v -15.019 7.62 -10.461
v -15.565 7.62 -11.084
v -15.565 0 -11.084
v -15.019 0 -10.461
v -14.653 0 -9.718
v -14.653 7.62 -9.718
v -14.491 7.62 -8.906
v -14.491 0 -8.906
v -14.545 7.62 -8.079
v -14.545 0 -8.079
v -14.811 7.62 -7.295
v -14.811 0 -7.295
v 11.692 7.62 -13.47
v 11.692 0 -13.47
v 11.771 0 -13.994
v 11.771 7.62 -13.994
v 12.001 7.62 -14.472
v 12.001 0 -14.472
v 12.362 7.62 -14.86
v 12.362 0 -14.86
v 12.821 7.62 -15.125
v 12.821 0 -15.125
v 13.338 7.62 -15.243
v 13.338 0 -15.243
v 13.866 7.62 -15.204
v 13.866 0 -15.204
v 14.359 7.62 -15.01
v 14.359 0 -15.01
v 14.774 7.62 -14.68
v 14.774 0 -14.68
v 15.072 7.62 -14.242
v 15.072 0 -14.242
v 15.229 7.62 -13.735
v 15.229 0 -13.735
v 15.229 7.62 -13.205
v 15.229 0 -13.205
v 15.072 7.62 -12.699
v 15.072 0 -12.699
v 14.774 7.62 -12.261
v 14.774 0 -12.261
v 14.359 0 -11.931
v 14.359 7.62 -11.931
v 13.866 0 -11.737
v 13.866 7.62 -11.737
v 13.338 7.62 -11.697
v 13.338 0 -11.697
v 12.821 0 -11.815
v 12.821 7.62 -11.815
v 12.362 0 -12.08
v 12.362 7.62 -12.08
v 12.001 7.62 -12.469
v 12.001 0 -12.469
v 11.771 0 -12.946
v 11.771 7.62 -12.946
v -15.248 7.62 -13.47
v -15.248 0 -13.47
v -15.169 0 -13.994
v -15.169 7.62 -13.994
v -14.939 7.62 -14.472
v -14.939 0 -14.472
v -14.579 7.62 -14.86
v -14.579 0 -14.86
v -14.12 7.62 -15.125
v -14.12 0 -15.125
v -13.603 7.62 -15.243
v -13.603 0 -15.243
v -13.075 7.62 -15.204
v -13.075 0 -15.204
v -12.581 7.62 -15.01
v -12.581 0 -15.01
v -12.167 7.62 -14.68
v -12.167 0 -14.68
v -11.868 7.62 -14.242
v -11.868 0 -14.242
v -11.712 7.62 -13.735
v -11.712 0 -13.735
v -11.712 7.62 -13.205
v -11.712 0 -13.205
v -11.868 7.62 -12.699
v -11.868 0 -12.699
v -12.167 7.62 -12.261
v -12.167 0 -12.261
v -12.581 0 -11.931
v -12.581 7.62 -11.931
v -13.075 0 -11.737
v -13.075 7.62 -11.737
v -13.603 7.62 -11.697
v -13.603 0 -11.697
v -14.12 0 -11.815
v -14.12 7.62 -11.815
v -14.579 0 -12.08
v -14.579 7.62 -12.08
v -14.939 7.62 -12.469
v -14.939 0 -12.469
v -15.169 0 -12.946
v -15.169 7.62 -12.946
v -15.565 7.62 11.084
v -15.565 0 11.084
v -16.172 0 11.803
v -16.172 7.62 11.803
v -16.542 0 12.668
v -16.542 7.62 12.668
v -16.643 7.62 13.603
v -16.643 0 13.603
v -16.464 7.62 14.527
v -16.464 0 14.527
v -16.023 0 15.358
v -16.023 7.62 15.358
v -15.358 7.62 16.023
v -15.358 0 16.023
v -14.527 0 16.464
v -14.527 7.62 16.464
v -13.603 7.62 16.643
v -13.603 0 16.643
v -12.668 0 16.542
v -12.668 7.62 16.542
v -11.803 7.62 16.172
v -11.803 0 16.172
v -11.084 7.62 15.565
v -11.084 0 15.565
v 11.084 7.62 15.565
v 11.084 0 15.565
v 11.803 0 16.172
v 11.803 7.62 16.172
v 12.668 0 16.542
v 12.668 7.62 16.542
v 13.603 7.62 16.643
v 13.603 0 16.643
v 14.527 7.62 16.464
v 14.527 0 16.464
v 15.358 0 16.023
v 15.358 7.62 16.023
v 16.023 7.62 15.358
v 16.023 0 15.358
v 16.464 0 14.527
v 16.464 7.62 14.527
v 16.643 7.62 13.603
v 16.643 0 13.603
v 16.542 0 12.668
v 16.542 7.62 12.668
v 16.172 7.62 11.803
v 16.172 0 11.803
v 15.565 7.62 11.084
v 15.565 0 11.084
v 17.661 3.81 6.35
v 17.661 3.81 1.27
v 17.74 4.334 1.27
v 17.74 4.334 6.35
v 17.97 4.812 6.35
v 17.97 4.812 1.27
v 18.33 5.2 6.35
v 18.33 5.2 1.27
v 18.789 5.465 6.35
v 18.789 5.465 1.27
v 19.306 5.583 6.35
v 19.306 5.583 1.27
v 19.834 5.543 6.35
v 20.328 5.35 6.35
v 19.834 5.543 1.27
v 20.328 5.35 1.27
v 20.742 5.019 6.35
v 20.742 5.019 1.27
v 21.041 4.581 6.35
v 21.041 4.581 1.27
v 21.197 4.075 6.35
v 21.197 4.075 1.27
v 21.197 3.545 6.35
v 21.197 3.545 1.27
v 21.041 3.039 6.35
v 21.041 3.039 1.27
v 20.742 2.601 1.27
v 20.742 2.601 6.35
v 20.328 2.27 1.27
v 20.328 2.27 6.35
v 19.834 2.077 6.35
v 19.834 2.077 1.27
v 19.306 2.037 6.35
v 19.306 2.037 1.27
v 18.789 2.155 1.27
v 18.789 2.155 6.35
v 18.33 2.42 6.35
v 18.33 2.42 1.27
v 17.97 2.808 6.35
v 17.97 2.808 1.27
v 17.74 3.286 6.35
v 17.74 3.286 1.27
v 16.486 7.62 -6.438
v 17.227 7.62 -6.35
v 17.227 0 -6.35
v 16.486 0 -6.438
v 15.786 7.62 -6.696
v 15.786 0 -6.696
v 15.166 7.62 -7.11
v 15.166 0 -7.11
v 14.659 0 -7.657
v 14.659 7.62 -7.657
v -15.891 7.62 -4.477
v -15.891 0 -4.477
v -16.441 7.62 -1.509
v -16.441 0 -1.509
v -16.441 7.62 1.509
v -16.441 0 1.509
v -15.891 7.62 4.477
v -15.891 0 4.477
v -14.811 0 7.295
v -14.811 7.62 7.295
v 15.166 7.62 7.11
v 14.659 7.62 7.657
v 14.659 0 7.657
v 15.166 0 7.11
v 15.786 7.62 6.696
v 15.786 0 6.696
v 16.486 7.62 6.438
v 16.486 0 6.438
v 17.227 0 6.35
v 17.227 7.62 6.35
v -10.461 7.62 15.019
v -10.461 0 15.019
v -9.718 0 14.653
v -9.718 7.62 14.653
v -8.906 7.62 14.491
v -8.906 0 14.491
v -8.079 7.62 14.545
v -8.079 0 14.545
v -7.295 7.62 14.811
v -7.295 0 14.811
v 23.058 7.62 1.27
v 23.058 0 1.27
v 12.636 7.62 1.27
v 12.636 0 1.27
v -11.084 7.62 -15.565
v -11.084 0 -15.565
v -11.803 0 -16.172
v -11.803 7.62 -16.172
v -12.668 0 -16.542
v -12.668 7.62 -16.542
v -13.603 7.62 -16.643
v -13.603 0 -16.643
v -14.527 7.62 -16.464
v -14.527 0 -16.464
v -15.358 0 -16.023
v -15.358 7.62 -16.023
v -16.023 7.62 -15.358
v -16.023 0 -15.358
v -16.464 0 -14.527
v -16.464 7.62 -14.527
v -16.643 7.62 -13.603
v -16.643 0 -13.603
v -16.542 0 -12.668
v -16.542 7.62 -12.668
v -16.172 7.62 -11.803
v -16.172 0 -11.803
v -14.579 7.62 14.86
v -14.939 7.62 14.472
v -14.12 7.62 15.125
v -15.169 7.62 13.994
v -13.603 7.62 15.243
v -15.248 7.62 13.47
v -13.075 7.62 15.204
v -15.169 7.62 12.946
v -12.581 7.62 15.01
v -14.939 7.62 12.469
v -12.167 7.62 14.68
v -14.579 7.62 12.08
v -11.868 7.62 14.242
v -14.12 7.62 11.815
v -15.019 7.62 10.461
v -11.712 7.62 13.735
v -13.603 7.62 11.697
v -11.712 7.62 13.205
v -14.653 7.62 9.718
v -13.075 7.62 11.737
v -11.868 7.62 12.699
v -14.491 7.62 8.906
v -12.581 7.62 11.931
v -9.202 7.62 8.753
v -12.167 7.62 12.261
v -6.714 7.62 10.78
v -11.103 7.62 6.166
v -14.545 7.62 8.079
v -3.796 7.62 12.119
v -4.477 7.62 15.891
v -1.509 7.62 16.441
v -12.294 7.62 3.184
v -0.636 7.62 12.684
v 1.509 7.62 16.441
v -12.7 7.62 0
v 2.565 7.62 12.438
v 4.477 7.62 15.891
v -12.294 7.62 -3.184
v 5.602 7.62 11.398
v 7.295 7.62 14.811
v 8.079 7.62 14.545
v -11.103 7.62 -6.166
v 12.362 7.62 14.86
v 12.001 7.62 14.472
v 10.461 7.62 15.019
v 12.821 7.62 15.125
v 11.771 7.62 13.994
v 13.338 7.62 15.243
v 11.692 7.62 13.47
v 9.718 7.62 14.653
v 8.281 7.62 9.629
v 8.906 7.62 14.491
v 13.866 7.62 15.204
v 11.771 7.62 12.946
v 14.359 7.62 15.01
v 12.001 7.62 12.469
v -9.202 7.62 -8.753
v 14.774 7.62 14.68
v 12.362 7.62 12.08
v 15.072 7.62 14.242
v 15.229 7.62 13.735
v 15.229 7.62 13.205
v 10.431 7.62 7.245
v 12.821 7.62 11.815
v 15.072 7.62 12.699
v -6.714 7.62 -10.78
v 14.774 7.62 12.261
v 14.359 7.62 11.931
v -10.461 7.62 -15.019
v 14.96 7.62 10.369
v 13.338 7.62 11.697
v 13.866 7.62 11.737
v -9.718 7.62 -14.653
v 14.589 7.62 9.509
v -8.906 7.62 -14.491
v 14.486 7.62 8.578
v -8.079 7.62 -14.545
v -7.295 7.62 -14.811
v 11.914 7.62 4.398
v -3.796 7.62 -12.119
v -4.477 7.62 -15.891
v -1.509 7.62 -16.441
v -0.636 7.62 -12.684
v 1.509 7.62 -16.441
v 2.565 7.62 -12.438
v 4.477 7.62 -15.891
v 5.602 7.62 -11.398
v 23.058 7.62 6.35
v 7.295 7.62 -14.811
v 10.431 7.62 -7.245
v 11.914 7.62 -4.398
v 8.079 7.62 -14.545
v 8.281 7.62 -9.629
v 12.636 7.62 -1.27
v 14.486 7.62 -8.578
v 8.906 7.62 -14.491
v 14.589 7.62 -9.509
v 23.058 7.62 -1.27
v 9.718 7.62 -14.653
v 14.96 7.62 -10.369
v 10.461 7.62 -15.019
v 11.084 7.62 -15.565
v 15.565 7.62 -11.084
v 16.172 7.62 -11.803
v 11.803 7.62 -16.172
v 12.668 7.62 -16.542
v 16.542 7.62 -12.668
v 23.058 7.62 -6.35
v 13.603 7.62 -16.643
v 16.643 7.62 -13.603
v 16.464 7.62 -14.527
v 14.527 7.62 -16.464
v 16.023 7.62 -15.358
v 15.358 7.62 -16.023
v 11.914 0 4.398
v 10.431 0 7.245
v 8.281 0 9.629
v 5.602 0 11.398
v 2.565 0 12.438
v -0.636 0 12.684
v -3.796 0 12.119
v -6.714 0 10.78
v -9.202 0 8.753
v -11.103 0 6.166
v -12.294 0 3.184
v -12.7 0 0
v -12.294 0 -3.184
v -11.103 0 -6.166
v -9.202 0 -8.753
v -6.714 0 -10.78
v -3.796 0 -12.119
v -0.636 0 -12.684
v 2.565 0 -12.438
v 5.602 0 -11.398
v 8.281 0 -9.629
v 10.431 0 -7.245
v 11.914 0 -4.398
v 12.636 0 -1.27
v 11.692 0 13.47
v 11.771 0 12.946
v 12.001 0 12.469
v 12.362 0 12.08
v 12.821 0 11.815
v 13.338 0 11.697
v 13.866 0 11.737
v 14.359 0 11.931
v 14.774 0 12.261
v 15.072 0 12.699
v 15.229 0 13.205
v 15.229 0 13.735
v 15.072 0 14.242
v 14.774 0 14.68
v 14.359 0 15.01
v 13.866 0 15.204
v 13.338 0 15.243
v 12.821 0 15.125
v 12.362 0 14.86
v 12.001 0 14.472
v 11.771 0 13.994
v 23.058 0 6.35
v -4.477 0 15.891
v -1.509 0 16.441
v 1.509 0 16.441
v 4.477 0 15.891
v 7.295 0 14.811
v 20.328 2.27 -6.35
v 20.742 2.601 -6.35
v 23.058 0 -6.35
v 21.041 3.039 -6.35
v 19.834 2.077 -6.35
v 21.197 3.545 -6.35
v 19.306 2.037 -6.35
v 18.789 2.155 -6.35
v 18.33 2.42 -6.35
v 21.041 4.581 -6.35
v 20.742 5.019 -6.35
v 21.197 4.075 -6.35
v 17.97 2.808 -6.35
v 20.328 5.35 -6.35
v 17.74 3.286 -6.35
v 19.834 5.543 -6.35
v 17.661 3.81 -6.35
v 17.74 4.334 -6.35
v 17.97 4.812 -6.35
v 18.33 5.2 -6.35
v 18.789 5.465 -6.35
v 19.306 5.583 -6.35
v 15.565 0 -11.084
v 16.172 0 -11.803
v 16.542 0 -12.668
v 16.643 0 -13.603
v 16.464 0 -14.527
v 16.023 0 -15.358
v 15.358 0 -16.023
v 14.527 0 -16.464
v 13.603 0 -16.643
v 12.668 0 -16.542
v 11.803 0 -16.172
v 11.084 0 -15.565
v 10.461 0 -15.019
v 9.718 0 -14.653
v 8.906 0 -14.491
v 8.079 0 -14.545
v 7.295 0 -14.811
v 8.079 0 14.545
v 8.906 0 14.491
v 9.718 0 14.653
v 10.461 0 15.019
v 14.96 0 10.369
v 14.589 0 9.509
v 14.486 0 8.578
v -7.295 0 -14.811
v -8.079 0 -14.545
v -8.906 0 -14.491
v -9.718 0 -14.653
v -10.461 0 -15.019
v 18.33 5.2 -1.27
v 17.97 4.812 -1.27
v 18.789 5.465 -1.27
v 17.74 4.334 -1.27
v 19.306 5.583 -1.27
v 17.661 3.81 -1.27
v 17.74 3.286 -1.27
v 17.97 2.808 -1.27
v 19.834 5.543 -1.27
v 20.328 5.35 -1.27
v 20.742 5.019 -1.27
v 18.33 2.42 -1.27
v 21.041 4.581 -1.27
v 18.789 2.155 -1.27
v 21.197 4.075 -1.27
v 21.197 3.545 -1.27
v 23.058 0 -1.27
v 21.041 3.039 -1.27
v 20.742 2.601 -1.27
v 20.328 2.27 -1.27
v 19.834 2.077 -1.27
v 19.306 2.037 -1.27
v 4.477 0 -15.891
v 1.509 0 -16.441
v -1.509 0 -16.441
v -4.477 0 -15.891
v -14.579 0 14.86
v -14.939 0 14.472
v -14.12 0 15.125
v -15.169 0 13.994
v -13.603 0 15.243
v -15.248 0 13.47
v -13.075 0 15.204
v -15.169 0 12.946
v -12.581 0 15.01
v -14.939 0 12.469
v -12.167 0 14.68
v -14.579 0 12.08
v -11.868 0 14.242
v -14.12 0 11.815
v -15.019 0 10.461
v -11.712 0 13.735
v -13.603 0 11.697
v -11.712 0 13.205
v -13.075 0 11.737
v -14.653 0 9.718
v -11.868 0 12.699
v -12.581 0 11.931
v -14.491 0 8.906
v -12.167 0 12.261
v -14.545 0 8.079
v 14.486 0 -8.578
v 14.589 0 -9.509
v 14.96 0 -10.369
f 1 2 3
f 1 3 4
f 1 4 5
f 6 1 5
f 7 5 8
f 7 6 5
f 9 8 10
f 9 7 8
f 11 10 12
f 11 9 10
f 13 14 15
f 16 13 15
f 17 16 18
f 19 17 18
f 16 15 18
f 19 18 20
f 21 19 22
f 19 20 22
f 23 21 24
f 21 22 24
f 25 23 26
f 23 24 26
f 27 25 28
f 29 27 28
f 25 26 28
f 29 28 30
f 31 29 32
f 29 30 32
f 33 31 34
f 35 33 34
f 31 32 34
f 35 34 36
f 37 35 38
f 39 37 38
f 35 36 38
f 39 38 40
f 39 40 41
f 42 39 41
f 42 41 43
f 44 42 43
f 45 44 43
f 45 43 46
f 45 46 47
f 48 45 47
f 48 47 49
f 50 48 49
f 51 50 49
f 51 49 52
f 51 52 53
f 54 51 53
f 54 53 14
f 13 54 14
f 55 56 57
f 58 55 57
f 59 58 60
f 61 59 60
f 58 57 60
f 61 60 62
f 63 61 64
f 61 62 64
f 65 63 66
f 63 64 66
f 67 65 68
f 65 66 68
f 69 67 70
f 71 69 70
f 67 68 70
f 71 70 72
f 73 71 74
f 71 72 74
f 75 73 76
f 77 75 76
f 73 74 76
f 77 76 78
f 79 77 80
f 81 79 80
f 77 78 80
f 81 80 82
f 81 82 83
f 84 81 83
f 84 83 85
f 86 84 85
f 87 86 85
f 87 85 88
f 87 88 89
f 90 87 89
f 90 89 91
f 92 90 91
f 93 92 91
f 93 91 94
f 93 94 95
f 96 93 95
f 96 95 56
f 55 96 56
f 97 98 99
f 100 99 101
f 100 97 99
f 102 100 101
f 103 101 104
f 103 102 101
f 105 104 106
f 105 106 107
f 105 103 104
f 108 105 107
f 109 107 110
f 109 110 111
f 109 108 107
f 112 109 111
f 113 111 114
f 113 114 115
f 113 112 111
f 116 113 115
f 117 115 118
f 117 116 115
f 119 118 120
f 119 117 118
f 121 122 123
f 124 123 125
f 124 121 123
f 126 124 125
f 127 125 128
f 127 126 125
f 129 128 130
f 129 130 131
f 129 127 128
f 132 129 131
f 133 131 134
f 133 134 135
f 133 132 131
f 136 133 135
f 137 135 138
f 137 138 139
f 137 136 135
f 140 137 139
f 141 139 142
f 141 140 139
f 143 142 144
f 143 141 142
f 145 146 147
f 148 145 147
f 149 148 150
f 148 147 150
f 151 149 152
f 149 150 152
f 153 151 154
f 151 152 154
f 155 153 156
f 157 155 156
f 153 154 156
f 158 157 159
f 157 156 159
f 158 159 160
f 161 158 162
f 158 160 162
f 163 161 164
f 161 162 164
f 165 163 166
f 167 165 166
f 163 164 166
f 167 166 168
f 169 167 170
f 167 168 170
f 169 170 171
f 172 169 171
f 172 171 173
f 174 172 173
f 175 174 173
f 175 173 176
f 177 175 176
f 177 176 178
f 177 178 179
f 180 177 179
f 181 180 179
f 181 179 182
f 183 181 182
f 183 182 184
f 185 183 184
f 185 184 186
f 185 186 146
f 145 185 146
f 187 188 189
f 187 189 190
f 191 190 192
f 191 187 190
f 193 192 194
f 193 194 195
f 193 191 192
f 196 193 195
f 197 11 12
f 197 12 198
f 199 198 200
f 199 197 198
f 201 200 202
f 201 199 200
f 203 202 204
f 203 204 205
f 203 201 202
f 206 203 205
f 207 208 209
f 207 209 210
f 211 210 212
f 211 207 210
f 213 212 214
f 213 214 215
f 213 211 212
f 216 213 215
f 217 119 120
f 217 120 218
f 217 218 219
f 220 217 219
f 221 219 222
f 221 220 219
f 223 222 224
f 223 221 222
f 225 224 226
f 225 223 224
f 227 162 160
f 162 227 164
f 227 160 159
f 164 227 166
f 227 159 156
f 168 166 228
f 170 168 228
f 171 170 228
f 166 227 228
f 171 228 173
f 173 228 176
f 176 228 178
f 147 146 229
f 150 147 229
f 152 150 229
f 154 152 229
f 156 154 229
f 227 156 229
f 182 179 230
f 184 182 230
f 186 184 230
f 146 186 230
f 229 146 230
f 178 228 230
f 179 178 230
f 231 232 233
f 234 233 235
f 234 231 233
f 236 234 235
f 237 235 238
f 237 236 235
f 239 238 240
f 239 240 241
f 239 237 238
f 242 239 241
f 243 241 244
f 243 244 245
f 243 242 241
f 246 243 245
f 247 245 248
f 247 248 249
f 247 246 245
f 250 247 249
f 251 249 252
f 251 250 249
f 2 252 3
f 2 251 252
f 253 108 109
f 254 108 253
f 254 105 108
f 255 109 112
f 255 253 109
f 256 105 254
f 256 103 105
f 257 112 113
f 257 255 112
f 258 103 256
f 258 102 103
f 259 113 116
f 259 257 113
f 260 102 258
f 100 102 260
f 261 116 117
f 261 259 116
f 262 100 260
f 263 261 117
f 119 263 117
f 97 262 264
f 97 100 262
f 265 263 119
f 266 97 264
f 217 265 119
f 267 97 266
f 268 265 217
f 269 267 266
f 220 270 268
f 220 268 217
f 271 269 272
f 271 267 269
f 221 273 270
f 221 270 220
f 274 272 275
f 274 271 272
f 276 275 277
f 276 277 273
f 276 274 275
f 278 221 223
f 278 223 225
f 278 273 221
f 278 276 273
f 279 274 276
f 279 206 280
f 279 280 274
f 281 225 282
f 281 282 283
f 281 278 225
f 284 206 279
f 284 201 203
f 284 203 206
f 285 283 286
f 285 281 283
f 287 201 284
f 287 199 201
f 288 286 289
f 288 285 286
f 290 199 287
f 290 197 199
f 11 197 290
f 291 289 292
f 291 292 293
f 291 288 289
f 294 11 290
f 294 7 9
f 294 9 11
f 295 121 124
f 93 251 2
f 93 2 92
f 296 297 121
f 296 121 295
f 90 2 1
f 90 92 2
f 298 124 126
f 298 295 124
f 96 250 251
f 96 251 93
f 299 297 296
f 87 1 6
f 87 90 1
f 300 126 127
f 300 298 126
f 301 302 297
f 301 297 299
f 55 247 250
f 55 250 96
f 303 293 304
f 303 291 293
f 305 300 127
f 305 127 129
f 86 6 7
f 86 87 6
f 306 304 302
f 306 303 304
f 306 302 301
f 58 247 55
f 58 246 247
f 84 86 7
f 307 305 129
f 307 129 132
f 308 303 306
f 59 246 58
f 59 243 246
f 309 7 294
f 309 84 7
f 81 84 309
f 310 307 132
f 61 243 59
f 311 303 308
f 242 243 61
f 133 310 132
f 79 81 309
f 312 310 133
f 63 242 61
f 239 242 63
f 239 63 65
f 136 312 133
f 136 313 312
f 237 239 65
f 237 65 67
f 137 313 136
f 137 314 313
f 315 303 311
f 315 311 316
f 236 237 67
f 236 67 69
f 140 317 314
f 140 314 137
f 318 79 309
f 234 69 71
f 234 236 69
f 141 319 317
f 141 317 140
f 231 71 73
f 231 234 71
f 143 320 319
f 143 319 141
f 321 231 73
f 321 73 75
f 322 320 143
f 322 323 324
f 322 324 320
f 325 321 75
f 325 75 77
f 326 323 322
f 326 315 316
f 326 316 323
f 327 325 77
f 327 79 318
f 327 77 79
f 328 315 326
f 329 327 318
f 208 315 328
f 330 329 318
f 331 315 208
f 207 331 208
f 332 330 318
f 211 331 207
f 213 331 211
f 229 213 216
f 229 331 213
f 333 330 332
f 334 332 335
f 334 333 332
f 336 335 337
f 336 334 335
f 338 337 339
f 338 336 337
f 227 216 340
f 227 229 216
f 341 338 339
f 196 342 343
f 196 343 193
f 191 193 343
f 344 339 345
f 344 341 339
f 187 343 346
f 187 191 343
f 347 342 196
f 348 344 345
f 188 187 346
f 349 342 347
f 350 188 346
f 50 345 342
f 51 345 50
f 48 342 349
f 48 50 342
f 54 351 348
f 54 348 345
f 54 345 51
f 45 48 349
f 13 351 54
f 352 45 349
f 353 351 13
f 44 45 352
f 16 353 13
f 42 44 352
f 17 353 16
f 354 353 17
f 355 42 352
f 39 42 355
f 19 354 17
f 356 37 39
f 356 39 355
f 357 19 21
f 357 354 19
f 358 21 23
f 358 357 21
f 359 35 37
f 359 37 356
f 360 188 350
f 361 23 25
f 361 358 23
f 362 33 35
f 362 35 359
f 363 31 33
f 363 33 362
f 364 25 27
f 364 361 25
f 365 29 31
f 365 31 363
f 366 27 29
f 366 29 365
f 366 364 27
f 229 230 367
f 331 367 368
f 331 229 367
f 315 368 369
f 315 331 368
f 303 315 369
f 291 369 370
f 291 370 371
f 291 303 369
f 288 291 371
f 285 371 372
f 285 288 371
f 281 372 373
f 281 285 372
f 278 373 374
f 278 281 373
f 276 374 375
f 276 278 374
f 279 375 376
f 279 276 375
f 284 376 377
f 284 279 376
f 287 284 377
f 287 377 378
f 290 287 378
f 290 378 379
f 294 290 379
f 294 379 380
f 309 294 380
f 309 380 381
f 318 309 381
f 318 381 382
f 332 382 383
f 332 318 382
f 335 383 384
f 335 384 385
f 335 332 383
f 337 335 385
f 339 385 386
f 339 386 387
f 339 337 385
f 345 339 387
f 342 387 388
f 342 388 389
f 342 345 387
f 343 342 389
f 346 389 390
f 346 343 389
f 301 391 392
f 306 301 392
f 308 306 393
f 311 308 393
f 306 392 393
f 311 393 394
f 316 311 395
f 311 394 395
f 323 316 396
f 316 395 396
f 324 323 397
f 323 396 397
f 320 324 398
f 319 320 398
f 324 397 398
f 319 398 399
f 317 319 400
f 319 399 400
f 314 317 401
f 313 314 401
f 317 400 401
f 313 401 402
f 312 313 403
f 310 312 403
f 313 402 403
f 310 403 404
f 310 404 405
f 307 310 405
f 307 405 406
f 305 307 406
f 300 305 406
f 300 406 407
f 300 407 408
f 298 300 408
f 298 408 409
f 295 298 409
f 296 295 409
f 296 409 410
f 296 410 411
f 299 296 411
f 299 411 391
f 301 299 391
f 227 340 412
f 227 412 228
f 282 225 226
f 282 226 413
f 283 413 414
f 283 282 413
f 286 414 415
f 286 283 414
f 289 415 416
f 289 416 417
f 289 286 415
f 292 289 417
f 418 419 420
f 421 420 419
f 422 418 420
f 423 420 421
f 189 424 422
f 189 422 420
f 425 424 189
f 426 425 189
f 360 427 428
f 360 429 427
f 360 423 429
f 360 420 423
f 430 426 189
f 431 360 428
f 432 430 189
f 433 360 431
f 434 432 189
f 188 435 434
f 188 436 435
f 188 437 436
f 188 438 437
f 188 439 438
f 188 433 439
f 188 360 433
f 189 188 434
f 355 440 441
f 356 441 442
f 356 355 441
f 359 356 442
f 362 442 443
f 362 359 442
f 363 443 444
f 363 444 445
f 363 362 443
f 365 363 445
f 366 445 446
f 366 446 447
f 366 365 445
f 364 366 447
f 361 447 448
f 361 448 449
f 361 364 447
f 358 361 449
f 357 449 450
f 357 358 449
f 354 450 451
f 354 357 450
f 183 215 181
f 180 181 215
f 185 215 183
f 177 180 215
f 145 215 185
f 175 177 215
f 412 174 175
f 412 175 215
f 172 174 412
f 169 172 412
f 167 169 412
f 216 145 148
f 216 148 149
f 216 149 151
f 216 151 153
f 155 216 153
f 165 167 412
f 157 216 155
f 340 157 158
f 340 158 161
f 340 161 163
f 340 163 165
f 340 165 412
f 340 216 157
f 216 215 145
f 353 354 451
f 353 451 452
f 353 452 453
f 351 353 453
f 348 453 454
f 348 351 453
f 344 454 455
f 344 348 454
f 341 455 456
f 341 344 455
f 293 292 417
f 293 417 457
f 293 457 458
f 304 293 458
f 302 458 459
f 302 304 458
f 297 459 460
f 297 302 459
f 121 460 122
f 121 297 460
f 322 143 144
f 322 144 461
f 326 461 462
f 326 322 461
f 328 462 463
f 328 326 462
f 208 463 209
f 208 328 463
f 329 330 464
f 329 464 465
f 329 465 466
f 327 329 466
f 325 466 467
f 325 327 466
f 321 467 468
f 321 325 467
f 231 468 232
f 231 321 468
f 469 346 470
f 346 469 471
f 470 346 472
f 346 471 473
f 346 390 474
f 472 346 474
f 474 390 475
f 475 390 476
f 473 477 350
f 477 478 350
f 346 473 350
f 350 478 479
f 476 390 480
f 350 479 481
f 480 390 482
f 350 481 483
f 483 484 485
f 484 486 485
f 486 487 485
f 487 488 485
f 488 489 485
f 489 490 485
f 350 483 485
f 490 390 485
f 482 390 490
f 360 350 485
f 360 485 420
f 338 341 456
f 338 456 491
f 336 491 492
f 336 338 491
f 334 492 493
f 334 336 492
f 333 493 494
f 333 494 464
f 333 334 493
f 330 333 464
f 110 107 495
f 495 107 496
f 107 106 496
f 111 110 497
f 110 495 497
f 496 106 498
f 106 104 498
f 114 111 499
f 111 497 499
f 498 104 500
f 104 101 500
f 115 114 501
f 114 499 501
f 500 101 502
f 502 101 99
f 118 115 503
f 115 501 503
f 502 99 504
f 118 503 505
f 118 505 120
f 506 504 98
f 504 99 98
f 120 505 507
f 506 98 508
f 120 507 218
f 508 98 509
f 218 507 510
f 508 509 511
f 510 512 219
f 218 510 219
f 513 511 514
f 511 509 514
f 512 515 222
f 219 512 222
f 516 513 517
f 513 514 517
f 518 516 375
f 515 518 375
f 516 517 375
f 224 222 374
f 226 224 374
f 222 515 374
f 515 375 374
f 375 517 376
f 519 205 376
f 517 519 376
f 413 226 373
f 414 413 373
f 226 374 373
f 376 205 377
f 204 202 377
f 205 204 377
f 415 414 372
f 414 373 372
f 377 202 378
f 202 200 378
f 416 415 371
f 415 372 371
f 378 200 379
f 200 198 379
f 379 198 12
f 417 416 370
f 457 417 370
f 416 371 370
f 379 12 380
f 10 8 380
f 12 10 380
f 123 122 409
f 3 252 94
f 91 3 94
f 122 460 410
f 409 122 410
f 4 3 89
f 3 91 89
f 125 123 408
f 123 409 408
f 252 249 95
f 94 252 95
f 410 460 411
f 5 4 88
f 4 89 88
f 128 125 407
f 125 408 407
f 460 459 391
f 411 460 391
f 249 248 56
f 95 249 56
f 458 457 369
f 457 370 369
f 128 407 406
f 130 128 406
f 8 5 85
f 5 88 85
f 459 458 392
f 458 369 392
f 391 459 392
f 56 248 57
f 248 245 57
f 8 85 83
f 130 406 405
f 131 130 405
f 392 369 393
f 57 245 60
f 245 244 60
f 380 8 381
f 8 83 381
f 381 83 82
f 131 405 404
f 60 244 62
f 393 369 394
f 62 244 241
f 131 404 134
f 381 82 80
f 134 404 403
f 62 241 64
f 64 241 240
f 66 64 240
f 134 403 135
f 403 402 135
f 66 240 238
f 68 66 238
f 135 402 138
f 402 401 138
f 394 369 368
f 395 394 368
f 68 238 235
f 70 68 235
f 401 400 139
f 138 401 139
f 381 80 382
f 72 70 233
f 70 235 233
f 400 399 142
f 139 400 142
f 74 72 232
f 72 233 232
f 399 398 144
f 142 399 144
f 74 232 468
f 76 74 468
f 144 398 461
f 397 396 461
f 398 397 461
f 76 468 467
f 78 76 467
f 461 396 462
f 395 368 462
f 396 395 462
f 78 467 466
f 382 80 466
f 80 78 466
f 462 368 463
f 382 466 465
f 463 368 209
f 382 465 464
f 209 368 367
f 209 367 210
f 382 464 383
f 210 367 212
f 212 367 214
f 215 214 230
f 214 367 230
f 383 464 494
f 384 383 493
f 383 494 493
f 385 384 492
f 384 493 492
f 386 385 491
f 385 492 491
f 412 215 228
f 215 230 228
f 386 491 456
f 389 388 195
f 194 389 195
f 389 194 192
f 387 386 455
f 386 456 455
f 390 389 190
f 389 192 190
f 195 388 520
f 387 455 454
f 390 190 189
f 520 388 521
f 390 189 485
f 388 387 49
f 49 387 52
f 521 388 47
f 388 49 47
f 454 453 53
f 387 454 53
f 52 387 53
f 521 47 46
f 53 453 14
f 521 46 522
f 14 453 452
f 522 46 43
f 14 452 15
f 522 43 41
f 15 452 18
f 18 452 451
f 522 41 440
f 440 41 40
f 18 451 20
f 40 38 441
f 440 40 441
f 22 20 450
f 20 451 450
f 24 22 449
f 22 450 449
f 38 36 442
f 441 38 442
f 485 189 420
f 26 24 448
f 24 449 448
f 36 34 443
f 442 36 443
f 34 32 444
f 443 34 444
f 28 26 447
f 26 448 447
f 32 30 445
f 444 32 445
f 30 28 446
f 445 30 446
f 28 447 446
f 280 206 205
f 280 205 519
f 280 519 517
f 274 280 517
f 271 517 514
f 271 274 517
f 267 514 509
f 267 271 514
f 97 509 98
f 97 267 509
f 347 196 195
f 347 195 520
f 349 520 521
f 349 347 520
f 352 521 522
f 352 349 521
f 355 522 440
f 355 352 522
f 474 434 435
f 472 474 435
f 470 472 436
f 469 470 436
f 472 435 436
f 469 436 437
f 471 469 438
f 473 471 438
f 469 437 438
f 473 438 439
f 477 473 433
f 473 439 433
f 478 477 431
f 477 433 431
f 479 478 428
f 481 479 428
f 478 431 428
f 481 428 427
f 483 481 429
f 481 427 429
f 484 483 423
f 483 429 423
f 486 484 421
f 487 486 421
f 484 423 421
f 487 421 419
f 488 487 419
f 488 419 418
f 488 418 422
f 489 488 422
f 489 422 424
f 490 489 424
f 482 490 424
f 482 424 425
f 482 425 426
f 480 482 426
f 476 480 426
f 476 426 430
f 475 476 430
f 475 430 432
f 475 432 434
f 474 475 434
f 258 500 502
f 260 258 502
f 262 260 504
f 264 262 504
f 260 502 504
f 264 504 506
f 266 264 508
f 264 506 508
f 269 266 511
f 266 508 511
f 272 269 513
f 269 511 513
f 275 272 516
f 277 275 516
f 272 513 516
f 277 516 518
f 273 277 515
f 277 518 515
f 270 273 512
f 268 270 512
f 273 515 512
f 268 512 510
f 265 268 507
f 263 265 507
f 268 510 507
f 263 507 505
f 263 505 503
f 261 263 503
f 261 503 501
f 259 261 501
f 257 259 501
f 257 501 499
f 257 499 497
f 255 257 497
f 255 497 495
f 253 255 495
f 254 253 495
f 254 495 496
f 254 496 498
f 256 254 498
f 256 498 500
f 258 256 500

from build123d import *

# Parameters (mm, degrees)
BOSS_EXTRUDE1_DEPTH              = 7.62
CUT_EXTRUDE1_DEPTH               = 30.441514138
SKETCH3_W                        = 12.7
SKETCH3_H                        = 7.62
F_5_CLEARANCE_HOLE1_D            = 3.556
F_36_0_1065_DIAMETER_HOLE1_D     = 2.7051
F_36_0_1065_DIAMETER_HOLE1_DEPTH = 5.08
F_5_CLEARANCE_HOLE2_D            = 3.556
F_5_CLEARANCE_HOLE2_DEPTH        = 22.995384182


with BuildPart() as part:
    # Sketch1 → Boss-Extrude1 (new body)
    with BuildSketch(Plane(origin=(0, 7.62, 0), x_dir=(1, 0, 0), z_dir=(0, 1, 0))):
        with BuildLine():
            Line((23.057960451, -6.35), (23.057960451, 6.35))
            Line((23.057960451, 6.35), (17.227118157, 6.35))
            ThreePointArc((17.227118157, 6.35), (15.786457002, 6.695667846), (14.659490486, 7.657404449))
            ThreePointArc((14.659490486, 7.657404449), (14.589471792, 9.508848608), (15.564771332, 11.084138707))
            ThreePointArc((15.564771332, 11.084138707), (15.715448212, 15.715448212), (11.084138707, 15.564771332))
            ThreePointArc((11.084138707, 15.564771332), (9.317430783, 14.545190239), (7.295007228, 14.810907114))
            ThreePointArc((7.295007228, 14.810907114), (0, 16.51), (-7.295007228, 14.810907114))
            ThreePointArc((-7.295007228, 14.810907114), (-9.317430783, 14.545190239), (-11.084138707, 15.564771332))
            ThreePointArc((-11.084138707, 15.564771332), (-15.715448212, 15.715448212), (-15.564771332, 11.084138707))
            ThreePointArc((-15.564771332, 11.084138707), (-14.545190239, 9.317430783), (-14.810907114, 7.295007228))
            ThreePointArc((-14.810907114, 7.295007228), (-16.51, 0), (-14.810907114, -7.295007228))
            ThreePointArc((-14.810907114, -7.295007228), (-14.545190239, -9.317430783), (-15.564771332, -11.084138707))
            ThreePointArc((-15.564771332, -11.084138707), (-15.715448212, -15.715448212), (-11.084138707, -15.564771332))
            ThreePointArc((-11.084138707, -15.564771332), (-9.317430783, -14.545190239), (-7.295007228, -14.810907114))
            ThreePointArc((-7.295007228, -14.810907114), (0, -16.51), (7.295007228, -14.810907114))
            ThreePointArc((7.295007228, -14.810907114), (9.317430783, -14.545190239), (11.084138707, -15.564771332))
            ThreePointArc((11.084138707, -15.564771332), (15.715448212, -15.715448212), (15.564771332, -11.084138707))
            ThreePointArc((15.564771332, -11.084138707), (14.589471792, -9.508848608), (14.659490486, -7.657404449))
            ThreePointArc((14.659490486, -7.657404449), (15.786457002, -6.695667846), (17.227118157, -6.35))
            Line((17.227118157, -6.35), (23.057960451, -6.35))
        make_face()
    extrude(amount=-BOSS_EXTRUDE1_DEPTH)

    # Sketch2 → Cut-Extrude1 (cut, through all)
    with BuildSketch(Plane.XZ):
        with BuildLine():
            Line((23.057960451, -1.27), (23.057960451, 1.27))
            Line((23.057960451, 1.27), (12.636340451, 1.27))
            ThreePointArc((12.636340451, 1.27), (12.7, 0), (12.636340451, -1.27))
            Line((12.636340451, -1.27), (23.057960451, -1.27))
        make_face()
    extrude(amount=-CUT_EXTRUDE1_DEPTH, mode=Mode.SUBTRACT)

    # Sketch3 → Cut-Revolve1 (revolve, cut)
    with BuildSketch(Plane.XY):
        with Locations((6.35, 3.81)):
            Rectangle(SKETCH3_W, SKETCH3_H)
    revolve(axis=Axis((0, 7.62, 0), (0, -1, 0)), mode=Mode.SUBTRACT)

    # #5 Clearance Hole1 (through all)
    with Locations(Plane(origin=(0, 7.62, 0), x_dir=(1, 0, 0), z_dir=(0, 1, 0))):
        with Locations((13.470384182, -13.470384182), (-13.470384182, -13.470384182), (-13.470384182, 13.470384182), (13.470384182, 13.470384182)):
            Hole(F_5_CLEARANCE_HOLE1_D / 2)

    # #36 (0.1065) Diameter Hole1
    with Locations(Plane(origin=(0, 0, -6.35), x_dir=(-1, 0, 0), z_dir=(0, 0, -1))):
        with Locations((-19.438793191, 3.81)):
            Hole(F_36_0_1065_DIAMETER_HOLE1_D / 2, depth=F_36_0_1065_DIAMETER_HOLE1_DEPTH)

    # #5 Clearance Hole2
    with Locations(Plane.XY.offset(6.35)):
        with Locations((19.438793191, 3.81)):
            Hole(F_5_CLEARANCE_HOLE2_D / 2, depth=F_5_CLEARANCE_HOLE2_DEPTH)


solid = part.part
